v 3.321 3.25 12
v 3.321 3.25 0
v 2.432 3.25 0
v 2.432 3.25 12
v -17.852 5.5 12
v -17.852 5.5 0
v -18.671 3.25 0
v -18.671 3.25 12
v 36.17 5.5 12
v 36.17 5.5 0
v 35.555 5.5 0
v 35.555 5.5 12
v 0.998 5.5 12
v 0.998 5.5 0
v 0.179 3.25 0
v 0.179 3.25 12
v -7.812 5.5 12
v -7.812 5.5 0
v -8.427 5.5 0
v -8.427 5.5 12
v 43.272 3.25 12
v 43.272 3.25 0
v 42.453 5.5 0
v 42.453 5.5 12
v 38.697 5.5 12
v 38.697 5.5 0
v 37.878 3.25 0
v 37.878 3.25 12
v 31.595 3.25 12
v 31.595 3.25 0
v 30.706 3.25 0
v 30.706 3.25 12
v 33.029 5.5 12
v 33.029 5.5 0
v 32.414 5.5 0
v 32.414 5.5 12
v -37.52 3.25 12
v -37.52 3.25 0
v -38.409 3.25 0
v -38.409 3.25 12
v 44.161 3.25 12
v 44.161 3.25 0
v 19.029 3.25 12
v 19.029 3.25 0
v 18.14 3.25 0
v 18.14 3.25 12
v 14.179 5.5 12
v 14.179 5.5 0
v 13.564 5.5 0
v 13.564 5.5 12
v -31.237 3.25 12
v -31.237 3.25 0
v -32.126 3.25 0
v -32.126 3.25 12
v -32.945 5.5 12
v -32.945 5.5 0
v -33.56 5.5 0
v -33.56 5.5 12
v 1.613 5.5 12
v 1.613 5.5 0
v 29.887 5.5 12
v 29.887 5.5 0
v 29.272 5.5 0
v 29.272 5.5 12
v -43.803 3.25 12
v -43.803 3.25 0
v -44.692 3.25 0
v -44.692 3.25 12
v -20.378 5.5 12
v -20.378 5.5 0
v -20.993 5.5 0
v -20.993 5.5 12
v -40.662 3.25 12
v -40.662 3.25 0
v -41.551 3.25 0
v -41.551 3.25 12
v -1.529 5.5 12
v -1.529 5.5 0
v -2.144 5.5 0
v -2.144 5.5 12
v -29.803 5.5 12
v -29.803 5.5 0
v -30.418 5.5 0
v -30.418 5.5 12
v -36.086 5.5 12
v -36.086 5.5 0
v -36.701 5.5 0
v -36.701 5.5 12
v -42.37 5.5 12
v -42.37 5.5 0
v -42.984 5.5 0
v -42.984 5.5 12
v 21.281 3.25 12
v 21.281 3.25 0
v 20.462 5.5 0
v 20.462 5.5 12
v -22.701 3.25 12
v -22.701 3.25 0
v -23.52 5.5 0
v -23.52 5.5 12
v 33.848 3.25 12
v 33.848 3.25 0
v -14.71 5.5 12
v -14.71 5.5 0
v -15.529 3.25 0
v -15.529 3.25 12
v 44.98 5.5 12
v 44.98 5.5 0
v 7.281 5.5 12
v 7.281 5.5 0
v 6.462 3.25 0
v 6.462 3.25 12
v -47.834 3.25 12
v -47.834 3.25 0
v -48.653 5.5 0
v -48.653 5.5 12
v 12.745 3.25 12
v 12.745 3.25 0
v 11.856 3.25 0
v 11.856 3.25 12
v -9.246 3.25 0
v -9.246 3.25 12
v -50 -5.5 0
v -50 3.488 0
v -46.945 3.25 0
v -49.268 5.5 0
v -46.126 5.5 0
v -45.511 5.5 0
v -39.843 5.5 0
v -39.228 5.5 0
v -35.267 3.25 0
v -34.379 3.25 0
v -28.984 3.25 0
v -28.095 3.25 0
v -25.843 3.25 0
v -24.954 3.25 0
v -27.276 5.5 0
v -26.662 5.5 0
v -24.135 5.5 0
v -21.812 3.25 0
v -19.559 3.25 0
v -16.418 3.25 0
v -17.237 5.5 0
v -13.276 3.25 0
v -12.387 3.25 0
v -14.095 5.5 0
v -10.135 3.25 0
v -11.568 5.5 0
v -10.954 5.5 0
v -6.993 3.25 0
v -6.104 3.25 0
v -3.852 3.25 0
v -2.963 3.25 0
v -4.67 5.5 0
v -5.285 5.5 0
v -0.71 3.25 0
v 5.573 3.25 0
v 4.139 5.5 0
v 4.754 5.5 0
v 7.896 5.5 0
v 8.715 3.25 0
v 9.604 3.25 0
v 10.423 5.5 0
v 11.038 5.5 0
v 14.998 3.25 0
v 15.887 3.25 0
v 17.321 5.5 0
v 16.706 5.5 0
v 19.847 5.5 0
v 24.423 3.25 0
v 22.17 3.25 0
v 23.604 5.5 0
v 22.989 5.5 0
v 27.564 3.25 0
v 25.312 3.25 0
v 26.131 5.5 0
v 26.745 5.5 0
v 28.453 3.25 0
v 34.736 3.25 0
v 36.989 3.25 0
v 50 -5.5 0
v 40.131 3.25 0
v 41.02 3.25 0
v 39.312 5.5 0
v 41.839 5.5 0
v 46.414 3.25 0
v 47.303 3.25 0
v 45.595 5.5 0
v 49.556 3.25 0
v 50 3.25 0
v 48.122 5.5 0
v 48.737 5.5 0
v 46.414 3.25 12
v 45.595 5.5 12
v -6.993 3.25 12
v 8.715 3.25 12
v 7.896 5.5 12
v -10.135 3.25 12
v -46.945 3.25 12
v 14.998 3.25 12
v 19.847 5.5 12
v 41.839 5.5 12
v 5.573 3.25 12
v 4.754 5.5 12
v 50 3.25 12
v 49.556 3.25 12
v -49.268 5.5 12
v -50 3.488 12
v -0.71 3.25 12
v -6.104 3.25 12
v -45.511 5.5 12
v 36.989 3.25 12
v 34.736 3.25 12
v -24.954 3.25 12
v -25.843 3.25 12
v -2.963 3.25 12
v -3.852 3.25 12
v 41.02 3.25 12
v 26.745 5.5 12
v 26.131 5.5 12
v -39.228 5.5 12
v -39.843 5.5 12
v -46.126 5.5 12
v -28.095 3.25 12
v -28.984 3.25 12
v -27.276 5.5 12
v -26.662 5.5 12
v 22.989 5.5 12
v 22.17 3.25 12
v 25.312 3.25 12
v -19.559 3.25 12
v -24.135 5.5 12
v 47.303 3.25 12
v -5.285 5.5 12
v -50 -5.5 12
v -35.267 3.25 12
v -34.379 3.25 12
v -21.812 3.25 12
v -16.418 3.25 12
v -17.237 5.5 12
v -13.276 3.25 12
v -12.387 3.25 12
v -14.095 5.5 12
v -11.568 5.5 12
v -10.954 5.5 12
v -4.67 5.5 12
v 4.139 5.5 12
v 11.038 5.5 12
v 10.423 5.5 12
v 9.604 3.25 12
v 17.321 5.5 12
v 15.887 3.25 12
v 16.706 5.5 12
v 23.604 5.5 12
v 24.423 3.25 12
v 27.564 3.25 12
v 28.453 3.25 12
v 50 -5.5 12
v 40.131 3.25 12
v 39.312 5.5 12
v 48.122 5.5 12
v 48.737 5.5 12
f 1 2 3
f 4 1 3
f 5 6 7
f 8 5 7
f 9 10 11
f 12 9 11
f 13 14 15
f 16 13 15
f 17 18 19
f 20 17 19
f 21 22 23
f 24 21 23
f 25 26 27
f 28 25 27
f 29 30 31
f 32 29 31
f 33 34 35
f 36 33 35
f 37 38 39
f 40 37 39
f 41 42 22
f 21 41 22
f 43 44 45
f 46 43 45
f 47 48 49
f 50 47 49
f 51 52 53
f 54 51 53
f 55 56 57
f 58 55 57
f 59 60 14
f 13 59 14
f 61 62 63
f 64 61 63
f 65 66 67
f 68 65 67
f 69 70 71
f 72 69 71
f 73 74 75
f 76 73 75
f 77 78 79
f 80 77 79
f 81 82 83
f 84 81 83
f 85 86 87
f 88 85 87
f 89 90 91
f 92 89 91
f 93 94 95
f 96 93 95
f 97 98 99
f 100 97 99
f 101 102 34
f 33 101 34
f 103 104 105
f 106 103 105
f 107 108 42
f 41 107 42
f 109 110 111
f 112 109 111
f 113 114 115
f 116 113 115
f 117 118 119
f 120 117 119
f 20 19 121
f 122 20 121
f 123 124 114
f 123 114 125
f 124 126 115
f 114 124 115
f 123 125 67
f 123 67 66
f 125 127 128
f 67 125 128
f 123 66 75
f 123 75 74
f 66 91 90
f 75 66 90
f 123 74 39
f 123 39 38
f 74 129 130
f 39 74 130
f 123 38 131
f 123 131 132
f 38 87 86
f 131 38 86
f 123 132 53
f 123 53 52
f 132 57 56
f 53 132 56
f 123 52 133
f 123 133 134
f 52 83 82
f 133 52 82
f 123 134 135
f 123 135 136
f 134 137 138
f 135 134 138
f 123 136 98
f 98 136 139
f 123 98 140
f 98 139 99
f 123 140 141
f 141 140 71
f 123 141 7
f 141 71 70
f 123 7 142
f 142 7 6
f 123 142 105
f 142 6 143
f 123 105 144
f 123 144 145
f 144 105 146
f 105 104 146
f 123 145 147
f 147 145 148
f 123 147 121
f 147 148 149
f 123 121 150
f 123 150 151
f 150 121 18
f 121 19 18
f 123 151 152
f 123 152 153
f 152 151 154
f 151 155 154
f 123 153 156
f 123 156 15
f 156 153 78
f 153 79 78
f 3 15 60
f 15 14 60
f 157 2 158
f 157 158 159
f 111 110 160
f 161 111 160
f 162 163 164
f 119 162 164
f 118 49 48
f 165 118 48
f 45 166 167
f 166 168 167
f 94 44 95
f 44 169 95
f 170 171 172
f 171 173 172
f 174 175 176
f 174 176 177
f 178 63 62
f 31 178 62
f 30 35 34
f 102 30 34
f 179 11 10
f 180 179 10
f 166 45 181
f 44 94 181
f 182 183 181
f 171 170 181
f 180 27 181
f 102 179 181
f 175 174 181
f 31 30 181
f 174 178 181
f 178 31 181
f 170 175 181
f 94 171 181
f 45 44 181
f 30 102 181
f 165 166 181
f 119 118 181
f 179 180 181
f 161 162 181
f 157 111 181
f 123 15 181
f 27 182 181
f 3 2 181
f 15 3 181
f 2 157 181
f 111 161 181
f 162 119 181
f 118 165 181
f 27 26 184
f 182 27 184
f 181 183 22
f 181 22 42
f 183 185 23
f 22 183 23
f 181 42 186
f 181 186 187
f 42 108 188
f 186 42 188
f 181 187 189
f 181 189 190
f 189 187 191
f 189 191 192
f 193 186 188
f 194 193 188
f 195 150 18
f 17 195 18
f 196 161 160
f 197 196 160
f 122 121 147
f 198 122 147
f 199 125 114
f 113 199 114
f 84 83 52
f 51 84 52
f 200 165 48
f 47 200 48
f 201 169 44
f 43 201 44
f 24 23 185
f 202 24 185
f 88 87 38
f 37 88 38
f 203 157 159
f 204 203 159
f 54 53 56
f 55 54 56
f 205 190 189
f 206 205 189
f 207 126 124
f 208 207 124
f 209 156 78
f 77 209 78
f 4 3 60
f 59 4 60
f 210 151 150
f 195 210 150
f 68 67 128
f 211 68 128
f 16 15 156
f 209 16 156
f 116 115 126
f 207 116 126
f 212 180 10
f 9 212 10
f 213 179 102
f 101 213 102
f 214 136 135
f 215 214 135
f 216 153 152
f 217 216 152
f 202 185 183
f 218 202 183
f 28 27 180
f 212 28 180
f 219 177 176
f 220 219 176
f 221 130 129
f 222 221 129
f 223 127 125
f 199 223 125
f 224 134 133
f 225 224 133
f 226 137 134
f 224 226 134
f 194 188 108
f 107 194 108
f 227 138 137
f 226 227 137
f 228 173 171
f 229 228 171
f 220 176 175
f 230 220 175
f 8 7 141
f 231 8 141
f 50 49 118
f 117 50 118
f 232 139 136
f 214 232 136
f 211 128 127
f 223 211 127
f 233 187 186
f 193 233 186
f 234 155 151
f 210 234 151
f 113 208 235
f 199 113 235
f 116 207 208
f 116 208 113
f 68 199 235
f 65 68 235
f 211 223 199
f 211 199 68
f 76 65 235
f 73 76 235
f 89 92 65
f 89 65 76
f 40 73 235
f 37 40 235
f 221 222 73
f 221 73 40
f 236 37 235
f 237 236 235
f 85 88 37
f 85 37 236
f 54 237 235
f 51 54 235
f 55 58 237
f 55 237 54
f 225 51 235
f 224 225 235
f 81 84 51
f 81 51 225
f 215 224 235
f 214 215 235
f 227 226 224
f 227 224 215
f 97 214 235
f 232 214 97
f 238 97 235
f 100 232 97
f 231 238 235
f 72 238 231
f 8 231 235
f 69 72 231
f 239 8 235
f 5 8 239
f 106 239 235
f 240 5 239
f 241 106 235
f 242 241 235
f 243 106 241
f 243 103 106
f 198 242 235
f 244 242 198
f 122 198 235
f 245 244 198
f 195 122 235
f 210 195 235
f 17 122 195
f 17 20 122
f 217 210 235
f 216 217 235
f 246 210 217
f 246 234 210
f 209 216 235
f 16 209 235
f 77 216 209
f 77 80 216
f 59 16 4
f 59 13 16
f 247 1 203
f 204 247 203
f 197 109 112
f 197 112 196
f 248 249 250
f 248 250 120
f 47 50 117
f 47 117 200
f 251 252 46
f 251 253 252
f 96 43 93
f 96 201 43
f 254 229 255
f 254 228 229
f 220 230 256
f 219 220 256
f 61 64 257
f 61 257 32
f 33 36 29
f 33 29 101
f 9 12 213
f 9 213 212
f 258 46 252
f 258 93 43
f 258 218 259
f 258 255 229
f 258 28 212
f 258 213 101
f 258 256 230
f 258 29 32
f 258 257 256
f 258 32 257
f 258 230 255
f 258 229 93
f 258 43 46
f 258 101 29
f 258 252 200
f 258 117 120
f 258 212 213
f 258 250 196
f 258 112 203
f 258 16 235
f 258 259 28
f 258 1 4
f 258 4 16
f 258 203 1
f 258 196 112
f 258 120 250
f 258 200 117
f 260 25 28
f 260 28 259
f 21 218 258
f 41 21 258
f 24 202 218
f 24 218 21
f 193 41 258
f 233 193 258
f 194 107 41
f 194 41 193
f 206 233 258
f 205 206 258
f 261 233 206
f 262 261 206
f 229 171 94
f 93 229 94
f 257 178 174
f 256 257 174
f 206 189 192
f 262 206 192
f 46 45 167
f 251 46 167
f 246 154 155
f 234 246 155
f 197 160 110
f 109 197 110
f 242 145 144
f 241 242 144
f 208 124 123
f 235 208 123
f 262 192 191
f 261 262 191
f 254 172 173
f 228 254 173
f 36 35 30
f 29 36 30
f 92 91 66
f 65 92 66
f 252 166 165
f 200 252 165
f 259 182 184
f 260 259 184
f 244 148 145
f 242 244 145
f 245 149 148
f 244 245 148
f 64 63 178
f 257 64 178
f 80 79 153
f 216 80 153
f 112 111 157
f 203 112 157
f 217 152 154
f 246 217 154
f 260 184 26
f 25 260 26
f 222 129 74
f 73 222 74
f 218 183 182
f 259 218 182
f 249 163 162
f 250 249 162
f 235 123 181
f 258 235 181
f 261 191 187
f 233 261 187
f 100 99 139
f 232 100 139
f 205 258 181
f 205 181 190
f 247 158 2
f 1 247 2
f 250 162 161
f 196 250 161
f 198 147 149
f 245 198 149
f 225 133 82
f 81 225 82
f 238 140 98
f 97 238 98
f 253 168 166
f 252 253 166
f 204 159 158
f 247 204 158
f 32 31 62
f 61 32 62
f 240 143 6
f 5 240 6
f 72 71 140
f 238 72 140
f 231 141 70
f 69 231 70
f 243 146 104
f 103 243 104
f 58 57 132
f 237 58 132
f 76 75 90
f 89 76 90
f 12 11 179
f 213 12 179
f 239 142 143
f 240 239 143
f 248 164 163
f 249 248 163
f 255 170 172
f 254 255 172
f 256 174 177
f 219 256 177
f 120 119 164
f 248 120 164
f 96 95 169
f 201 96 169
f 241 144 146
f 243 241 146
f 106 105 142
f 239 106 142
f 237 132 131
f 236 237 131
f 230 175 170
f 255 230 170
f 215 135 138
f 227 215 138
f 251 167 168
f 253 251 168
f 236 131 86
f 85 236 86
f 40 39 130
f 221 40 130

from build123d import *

# Parameters (mm, degrees)
BOSS_EXTRUDE1_DEPTH = 12


with BuildPart() as part:
    # Sketch1 → Boss-Extrude1 (new body)
    with BuildSketch(Plane.XY):
        Polygon((-49.267596403, 5.5), (-50, 3.487737656), (-50, -5.5), (50, -5.5), (50, 3.25), (49.55556463, 3.25), (48.736631603, 5.5), (48.121775747, 5.5), (47.30284272, 3.25), (46.41397198, 3.25), (45.595038953, 5.5), (44.980183097, 5.5), (44.16125007, 3.25), (43.27237933, 3.25), (42.453446303, 5.5), (41.838590447, 5.5), (41.01965742, 3.25), (40.13078668, 3.25), (39.311853653, 5.5), (38.696997797, 5.5), (37.87806477, 3.25), (36.98919403, 3.25), (36.170261003, 5.5), (35.555405147, 5.5), (34.73647212, 3.25), (33.84760138, 3.25), (33.028668353, 5.5), (32.413812497, 5.5), (31.59487947, 3.25), (30.70600873, 3.25), (29.887075703, 5.5), (29.272219847, 5.5), (28.45328682, 3.25), (27.56441608, 3.25), (26.745483053, 5.5), (26.130627197, 5.5), (25.31169417, 3.25), (24.42282343, 3.25), (23.603890403, 5.5), (22.989034547, 5.5), (22.17010152, 3.25), (21.28123078, 3.25), (20.462297753, 5.5), (19.847441897, 5.5), (19.02850887, 3.25), (18.13963813, 3.25), (17.320705103, 5.5), (16.705849247, 5.5), (15.88691622, 3.25), (14.99804548, 3.25), (14.179112453, 5.5), (13.564256597, 5.5), (12.74532357, 3.25), (11.85645283, 3.25), (11.037519803, 5.5), (10.422663947, 5.5), (9.60373092, 3.25), (8.71486018, 3.25), (7.895927153, 5.5), (7.281071297, 5.5), (6.46213827, 3.25), (5.57326753, 3.25), (4.754334503, 5.5), (4.139478647, 5.5), (3.32054562, 3.25), (2.43167488, 3.25), (1.612741853, 5.5), (0.997885997, 5.5), (0.17895297, 3.25), (-0.70991777, 3.25), (-1.528850797, 5.5), (-2.143706653, 5.5), (-2.96263968, 3.25), (-3.85151042, 3.25), (-4.670443447, 5.5), (-5.285299303, 5.5), (-6.10423233, 3.25), (-6.99310307, 3.25), (-7.812036097, 5.5), (-8.426891953, 5.5), (-9.24582498, 3.25), (-10.13469572, 3.25), (-10.953628747, 5.5), (-11.568484603, 5.5), (-12.38741763, 3.25), (-13.27628837, 3.25), (-14.095221397, 5.5), (-14.710077253, 5.5), (-15.52901028, 3.25), (-16.41788102, 3.25), (-17.236814047, 5.5), (-17.851669903, 5.5), (-18.67060293, 3.25), (-19.55947367, 3.25), (-20.378406697, 5.5), (-20.993262553, 5.5), (-21.81219558, 3.25), (-22.70106632, 3.25), (-23.519999347, 5.5), (-24.134855203, 5.5), (-24.95378823, 3.25), (-25.84265897, 3.25), (-26.661591997, 5.5), (-27.276447853, 5.5), (-28.09538088, 3.25), (-28.98425162, 3.25), (-29.803184647, 5.5), (-30.418040503, 5.5), (-31.23697353, 3.25), (-32.12584427, 3.25), (-32.944777297, 5.5), (-33.559633153, 5.5), (-34.37856618, 3.25), (-35.26743692, 3.25), (-36.086369947, 5.5), (-36.701225803, 5.5), (-37.52015883, 3.25), (-38.40902957, 3.25), (-39.227962597, 5.5), (-39.842818453, 5.5), (-40.66175148, 3.25), (-41.55062222, 3.25), (-42.369555247, 5.5), (-42.984411103, 5.5), (-43.80334413, 3.25), (-44.69221487, 3.25), (-45.511147897, 5.5), (-46.126003753, 5.5), (-46.94493678, 3.25), (-47.83380752, 3.25), (-48.652740547, 5.5), align=None)
    extrude(amount=BOSS_EXTRUDE1_DEPTH)


solid = part.part
